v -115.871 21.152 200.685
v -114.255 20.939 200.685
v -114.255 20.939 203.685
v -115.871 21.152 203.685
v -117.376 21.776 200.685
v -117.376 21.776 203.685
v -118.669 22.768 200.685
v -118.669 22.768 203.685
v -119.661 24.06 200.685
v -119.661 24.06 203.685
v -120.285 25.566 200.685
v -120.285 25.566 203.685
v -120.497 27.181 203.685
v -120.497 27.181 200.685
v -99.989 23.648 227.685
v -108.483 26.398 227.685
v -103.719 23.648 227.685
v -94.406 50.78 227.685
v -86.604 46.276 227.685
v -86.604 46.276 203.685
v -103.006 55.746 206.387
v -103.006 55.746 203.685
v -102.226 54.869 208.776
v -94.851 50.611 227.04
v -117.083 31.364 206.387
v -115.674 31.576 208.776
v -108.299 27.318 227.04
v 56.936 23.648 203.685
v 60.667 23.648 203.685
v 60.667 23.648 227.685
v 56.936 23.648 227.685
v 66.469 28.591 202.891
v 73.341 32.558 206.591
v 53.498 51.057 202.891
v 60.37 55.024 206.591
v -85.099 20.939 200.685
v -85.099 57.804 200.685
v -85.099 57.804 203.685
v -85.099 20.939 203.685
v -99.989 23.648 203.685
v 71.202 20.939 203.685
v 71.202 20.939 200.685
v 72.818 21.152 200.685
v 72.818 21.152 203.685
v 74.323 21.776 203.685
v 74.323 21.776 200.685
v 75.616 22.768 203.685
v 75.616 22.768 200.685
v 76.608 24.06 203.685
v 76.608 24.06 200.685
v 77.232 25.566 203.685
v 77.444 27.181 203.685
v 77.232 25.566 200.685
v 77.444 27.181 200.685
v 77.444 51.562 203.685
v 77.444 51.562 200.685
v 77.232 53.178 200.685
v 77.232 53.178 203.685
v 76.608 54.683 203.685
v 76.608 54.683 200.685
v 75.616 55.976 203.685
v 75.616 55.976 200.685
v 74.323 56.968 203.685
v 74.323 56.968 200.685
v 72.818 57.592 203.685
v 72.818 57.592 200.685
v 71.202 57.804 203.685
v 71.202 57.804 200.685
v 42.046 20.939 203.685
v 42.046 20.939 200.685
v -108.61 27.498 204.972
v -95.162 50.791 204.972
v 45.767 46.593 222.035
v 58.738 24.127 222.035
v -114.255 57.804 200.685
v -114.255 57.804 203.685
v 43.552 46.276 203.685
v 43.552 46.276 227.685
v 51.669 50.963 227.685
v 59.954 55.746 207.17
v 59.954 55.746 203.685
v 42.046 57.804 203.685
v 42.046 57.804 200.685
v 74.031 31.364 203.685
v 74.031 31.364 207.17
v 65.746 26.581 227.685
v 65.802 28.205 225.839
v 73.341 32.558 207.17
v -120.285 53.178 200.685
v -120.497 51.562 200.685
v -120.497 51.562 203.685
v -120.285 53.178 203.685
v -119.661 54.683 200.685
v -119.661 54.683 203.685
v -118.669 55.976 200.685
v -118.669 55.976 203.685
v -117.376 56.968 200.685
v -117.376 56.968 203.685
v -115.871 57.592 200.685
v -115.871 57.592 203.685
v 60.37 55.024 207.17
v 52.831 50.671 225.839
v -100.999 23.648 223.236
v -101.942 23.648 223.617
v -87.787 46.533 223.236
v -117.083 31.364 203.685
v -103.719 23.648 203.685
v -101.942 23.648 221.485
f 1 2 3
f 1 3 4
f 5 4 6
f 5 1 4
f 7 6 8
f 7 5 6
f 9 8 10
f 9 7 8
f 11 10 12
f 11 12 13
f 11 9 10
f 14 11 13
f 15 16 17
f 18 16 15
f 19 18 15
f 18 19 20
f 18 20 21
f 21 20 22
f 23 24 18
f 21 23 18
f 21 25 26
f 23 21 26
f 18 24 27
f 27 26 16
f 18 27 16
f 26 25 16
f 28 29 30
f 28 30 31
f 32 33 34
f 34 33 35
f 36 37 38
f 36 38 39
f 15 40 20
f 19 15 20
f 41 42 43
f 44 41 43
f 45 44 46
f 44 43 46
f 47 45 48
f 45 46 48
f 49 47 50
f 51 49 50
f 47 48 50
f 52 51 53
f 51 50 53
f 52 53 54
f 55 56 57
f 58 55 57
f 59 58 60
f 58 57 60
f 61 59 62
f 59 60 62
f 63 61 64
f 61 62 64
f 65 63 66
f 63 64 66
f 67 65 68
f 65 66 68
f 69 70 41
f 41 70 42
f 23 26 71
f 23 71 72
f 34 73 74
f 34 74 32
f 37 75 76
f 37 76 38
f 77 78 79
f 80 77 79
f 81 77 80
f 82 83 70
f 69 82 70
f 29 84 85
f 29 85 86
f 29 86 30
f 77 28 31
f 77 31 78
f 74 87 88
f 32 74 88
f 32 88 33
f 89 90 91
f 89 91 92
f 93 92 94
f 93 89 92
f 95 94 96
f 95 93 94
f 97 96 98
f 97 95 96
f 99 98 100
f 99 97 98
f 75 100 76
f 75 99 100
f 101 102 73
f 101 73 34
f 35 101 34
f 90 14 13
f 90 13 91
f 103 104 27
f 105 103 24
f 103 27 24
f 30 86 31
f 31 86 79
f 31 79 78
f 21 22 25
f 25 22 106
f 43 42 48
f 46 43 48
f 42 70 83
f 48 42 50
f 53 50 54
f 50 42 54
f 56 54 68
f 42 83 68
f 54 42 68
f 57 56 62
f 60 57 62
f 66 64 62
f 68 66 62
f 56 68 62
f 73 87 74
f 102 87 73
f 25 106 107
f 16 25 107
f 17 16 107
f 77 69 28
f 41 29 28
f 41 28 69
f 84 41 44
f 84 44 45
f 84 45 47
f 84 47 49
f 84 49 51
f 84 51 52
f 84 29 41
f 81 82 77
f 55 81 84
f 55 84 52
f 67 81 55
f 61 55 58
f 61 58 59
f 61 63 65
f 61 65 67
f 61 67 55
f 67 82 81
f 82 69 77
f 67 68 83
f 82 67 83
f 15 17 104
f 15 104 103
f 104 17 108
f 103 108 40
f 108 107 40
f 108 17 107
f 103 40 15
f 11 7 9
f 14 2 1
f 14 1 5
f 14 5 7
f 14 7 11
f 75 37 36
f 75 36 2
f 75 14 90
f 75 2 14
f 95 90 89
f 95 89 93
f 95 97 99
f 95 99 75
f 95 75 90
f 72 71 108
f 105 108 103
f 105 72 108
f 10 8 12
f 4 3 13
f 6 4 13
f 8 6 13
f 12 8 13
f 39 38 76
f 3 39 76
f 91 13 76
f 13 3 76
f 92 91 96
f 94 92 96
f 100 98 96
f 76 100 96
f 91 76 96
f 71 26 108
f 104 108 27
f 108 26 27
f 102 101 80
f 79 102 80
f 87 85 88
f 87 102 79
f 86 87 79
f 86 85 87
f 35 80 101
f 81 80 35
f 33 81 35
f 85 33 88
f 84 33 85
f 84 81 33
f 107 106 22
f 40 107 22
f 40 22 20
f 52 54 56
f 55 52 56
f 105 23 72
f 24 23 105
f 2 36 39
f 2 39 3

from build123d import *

# Parameters (mm, degrees)
AUFSATZ_LINEAR_AUSTRAGEN1_DEPTH   = 3
AUFSATZ_LINEAR_AUSTRAGEN1_2_DEPTH = 3
AUFSATZ_LINEAR_AUSTRAGEN2_DEPTH   = 24
SCHNITT_LINEAR_AUSTRAGEN2_DEPTH   = 121.161965349
SCHNITT_LINEAR_AUSTRAGEN3_DEPTH   = 54
SKIZZE7_W                         = 20.151946154
SKIZZE7_H                         = 26.896200326
SCHNITT_LINEAR_AUSTRAGEN4_DEPTH   = 9
SKIZZE8_W                         = 21.124076697
SKIZZE8_H                         = 25.941583557
SCHNITT_LINEAR_AUSTRAGEN5_DEPTH   = 9


with BuildPart() as part:
    # Skizze1 → Aufsatz-Linear austragen1 (new body)
    with BuildSketch(Plane.XY.offset(200.684819625)):
        with BuildLine():
            Line((42.046255802, 20.93937831), (71.202450647, 20.93937831))
            ThreePointArc((71.202450647, 20.93937831), (75.616222333, 22.767622404), (77.444466427, 27.181394091))
            Line((77.444466427, 27.181394091), (77.444466427, 51.562209578))
            ThreePointArc((77.444466427, 51.562209578), (75.616222333, 55.975981265), (71.202450647, 57.804225359))
            Line((71.202450647, 57.804225359), (42.046255802, 57.804225359))
            Line((42.046255802, 57.804225359), (42.046255802, 20.93937831))
        make_face()
    extrude(amount=AUFSATZ_LINEAR_AUSTRAGEN1_DEPTH)

    # Skizze3 → Aufsatz-Linear austragen2 (add)
    with BuildSketch(Plane.XY.offset(203.684819625)):
        Polygon((59.953619506, 55.745700513), (74.030511905, 31.363807665), (60.666568647, 23.648131427), (56.936007357, 23.648131427), (43.55153333, 46.275951643), align=None)
        Polygon((-103.006425052, 55.745700513), (-117.083317451, 31.363807665), (-103.719374193, 23.648131427), (-99.988812903, 23.648131427), (-86.604338875, 46.275951643), align=None)
    extrude(amount=AUFSATZ_LINEAR_AUSTRAGEN2_DEPTH)

    # Skizze4 → Schnitt-Linear austragen2 (cut, through all)
    with BuildSketch(Plane(origin=(4.926700878, -8.533296234, 0), x_dir=(-0.866025404, -0.5, 0), z_dir=(0.5, -0.866025404, 0))):
        Polygon((-80.497261448, -205.66236291), (-69.016877495, -230.282125747), (-80.497261448, -230.282125747), align=None)
    extrude(amount=-SCHNITT_LINEAR_AUSTRAGEN2_DEPTH, mode=Mode.SUBTRACT)

    # Skizze6 → Schnitt-Linear austragen3 (cut)
    with BuildSketch(Plane(origin=(-15.689902264, -27.175707887, 0), x_dir=(0.866025404, -0.5, 0), z_dir=(-0.5, -0.866025404, 0))):
        Polygon((-117.901019581, 204.624426213), (-104.683579141, 232.969318707), (-117.901019581, 232.969318707), align=None)
    extrude(amount=-SCHNITT_LINEAR_AUSTRAGEN3_DEPTH, mode=Mode.SUBTRACT)

    # Skizze7 → Schnitt-Linear austragen4 (cut)
    with BuildSketch(Plane(origin=(-151.743992107, 87.609434691, 81.705900646), x_dir=(0.365998151, -0.211309131, 0.906307787), z_dir=(-0.784885567, 0.453153894, 0.422618262))):
        with Locations((150.282281882, -17.043094839)):
            Rectangle(SKIZZE7_W, SKIZZE7_H)
    extrude(amount=-SCHNITT_LINEAR_AUSTRAGEN4_DEPTH, mode=Mode.SUBTRACT)

    # Skizze8 → Schnitt-Linear austragen5 (cut)
    with BuildSketch(Plane(origin=(125.481198092, 72.446603496, 67.564812035), x_dir=(0.365998151, 0.211309131, -0.906307787), z_dir=(0.784885567, 0.453153894, 0.422618262))):
        with Locations((-164.074275128, 4.496338843)):
            Rectangle(SKIZZE8_W, SKIZZE8_H)
    extrude(amount=-SCHNITT_LINEAR_AUSTRAGEN5_DEPTH, mode=Mode.SUBTRACT)


with BuildPart() as body_2:
    # Skizze1 → Aufsatz-Linear austragen1 2 (new body)
    with BuildSketch(Plane.XY.offset(200.684819625)):
        with BuildLine():
            Line((-85.099061347, 57.804225359), (-85.099061347, 20.93937831))
            Line((-85.099061347, 20.93937831), (-114.255256192, 20.93937831))
            ThreePointArc((-114.255256192, 20.93937831), (-118.669027879, 22.767622404), (-120.497271973, 27.181394091))
            Line((-120.497271973, 27.181394091), (-120.497271973, 51.562209578))
            ThreePointArc((-120.497271973, 51.562209578), (-118.669027879, 55.975981265), (-114.255256192, 57.804225359))
            Line((-114.255256192, 57.804225359), (-85.099061347, 57.804225359))
        make_face()
    extrude(amount=AUFSATZ_LINEAR_AUSTRAGEN1_2_DEPTH)


solid = Compound([part.part, body_2.part])
